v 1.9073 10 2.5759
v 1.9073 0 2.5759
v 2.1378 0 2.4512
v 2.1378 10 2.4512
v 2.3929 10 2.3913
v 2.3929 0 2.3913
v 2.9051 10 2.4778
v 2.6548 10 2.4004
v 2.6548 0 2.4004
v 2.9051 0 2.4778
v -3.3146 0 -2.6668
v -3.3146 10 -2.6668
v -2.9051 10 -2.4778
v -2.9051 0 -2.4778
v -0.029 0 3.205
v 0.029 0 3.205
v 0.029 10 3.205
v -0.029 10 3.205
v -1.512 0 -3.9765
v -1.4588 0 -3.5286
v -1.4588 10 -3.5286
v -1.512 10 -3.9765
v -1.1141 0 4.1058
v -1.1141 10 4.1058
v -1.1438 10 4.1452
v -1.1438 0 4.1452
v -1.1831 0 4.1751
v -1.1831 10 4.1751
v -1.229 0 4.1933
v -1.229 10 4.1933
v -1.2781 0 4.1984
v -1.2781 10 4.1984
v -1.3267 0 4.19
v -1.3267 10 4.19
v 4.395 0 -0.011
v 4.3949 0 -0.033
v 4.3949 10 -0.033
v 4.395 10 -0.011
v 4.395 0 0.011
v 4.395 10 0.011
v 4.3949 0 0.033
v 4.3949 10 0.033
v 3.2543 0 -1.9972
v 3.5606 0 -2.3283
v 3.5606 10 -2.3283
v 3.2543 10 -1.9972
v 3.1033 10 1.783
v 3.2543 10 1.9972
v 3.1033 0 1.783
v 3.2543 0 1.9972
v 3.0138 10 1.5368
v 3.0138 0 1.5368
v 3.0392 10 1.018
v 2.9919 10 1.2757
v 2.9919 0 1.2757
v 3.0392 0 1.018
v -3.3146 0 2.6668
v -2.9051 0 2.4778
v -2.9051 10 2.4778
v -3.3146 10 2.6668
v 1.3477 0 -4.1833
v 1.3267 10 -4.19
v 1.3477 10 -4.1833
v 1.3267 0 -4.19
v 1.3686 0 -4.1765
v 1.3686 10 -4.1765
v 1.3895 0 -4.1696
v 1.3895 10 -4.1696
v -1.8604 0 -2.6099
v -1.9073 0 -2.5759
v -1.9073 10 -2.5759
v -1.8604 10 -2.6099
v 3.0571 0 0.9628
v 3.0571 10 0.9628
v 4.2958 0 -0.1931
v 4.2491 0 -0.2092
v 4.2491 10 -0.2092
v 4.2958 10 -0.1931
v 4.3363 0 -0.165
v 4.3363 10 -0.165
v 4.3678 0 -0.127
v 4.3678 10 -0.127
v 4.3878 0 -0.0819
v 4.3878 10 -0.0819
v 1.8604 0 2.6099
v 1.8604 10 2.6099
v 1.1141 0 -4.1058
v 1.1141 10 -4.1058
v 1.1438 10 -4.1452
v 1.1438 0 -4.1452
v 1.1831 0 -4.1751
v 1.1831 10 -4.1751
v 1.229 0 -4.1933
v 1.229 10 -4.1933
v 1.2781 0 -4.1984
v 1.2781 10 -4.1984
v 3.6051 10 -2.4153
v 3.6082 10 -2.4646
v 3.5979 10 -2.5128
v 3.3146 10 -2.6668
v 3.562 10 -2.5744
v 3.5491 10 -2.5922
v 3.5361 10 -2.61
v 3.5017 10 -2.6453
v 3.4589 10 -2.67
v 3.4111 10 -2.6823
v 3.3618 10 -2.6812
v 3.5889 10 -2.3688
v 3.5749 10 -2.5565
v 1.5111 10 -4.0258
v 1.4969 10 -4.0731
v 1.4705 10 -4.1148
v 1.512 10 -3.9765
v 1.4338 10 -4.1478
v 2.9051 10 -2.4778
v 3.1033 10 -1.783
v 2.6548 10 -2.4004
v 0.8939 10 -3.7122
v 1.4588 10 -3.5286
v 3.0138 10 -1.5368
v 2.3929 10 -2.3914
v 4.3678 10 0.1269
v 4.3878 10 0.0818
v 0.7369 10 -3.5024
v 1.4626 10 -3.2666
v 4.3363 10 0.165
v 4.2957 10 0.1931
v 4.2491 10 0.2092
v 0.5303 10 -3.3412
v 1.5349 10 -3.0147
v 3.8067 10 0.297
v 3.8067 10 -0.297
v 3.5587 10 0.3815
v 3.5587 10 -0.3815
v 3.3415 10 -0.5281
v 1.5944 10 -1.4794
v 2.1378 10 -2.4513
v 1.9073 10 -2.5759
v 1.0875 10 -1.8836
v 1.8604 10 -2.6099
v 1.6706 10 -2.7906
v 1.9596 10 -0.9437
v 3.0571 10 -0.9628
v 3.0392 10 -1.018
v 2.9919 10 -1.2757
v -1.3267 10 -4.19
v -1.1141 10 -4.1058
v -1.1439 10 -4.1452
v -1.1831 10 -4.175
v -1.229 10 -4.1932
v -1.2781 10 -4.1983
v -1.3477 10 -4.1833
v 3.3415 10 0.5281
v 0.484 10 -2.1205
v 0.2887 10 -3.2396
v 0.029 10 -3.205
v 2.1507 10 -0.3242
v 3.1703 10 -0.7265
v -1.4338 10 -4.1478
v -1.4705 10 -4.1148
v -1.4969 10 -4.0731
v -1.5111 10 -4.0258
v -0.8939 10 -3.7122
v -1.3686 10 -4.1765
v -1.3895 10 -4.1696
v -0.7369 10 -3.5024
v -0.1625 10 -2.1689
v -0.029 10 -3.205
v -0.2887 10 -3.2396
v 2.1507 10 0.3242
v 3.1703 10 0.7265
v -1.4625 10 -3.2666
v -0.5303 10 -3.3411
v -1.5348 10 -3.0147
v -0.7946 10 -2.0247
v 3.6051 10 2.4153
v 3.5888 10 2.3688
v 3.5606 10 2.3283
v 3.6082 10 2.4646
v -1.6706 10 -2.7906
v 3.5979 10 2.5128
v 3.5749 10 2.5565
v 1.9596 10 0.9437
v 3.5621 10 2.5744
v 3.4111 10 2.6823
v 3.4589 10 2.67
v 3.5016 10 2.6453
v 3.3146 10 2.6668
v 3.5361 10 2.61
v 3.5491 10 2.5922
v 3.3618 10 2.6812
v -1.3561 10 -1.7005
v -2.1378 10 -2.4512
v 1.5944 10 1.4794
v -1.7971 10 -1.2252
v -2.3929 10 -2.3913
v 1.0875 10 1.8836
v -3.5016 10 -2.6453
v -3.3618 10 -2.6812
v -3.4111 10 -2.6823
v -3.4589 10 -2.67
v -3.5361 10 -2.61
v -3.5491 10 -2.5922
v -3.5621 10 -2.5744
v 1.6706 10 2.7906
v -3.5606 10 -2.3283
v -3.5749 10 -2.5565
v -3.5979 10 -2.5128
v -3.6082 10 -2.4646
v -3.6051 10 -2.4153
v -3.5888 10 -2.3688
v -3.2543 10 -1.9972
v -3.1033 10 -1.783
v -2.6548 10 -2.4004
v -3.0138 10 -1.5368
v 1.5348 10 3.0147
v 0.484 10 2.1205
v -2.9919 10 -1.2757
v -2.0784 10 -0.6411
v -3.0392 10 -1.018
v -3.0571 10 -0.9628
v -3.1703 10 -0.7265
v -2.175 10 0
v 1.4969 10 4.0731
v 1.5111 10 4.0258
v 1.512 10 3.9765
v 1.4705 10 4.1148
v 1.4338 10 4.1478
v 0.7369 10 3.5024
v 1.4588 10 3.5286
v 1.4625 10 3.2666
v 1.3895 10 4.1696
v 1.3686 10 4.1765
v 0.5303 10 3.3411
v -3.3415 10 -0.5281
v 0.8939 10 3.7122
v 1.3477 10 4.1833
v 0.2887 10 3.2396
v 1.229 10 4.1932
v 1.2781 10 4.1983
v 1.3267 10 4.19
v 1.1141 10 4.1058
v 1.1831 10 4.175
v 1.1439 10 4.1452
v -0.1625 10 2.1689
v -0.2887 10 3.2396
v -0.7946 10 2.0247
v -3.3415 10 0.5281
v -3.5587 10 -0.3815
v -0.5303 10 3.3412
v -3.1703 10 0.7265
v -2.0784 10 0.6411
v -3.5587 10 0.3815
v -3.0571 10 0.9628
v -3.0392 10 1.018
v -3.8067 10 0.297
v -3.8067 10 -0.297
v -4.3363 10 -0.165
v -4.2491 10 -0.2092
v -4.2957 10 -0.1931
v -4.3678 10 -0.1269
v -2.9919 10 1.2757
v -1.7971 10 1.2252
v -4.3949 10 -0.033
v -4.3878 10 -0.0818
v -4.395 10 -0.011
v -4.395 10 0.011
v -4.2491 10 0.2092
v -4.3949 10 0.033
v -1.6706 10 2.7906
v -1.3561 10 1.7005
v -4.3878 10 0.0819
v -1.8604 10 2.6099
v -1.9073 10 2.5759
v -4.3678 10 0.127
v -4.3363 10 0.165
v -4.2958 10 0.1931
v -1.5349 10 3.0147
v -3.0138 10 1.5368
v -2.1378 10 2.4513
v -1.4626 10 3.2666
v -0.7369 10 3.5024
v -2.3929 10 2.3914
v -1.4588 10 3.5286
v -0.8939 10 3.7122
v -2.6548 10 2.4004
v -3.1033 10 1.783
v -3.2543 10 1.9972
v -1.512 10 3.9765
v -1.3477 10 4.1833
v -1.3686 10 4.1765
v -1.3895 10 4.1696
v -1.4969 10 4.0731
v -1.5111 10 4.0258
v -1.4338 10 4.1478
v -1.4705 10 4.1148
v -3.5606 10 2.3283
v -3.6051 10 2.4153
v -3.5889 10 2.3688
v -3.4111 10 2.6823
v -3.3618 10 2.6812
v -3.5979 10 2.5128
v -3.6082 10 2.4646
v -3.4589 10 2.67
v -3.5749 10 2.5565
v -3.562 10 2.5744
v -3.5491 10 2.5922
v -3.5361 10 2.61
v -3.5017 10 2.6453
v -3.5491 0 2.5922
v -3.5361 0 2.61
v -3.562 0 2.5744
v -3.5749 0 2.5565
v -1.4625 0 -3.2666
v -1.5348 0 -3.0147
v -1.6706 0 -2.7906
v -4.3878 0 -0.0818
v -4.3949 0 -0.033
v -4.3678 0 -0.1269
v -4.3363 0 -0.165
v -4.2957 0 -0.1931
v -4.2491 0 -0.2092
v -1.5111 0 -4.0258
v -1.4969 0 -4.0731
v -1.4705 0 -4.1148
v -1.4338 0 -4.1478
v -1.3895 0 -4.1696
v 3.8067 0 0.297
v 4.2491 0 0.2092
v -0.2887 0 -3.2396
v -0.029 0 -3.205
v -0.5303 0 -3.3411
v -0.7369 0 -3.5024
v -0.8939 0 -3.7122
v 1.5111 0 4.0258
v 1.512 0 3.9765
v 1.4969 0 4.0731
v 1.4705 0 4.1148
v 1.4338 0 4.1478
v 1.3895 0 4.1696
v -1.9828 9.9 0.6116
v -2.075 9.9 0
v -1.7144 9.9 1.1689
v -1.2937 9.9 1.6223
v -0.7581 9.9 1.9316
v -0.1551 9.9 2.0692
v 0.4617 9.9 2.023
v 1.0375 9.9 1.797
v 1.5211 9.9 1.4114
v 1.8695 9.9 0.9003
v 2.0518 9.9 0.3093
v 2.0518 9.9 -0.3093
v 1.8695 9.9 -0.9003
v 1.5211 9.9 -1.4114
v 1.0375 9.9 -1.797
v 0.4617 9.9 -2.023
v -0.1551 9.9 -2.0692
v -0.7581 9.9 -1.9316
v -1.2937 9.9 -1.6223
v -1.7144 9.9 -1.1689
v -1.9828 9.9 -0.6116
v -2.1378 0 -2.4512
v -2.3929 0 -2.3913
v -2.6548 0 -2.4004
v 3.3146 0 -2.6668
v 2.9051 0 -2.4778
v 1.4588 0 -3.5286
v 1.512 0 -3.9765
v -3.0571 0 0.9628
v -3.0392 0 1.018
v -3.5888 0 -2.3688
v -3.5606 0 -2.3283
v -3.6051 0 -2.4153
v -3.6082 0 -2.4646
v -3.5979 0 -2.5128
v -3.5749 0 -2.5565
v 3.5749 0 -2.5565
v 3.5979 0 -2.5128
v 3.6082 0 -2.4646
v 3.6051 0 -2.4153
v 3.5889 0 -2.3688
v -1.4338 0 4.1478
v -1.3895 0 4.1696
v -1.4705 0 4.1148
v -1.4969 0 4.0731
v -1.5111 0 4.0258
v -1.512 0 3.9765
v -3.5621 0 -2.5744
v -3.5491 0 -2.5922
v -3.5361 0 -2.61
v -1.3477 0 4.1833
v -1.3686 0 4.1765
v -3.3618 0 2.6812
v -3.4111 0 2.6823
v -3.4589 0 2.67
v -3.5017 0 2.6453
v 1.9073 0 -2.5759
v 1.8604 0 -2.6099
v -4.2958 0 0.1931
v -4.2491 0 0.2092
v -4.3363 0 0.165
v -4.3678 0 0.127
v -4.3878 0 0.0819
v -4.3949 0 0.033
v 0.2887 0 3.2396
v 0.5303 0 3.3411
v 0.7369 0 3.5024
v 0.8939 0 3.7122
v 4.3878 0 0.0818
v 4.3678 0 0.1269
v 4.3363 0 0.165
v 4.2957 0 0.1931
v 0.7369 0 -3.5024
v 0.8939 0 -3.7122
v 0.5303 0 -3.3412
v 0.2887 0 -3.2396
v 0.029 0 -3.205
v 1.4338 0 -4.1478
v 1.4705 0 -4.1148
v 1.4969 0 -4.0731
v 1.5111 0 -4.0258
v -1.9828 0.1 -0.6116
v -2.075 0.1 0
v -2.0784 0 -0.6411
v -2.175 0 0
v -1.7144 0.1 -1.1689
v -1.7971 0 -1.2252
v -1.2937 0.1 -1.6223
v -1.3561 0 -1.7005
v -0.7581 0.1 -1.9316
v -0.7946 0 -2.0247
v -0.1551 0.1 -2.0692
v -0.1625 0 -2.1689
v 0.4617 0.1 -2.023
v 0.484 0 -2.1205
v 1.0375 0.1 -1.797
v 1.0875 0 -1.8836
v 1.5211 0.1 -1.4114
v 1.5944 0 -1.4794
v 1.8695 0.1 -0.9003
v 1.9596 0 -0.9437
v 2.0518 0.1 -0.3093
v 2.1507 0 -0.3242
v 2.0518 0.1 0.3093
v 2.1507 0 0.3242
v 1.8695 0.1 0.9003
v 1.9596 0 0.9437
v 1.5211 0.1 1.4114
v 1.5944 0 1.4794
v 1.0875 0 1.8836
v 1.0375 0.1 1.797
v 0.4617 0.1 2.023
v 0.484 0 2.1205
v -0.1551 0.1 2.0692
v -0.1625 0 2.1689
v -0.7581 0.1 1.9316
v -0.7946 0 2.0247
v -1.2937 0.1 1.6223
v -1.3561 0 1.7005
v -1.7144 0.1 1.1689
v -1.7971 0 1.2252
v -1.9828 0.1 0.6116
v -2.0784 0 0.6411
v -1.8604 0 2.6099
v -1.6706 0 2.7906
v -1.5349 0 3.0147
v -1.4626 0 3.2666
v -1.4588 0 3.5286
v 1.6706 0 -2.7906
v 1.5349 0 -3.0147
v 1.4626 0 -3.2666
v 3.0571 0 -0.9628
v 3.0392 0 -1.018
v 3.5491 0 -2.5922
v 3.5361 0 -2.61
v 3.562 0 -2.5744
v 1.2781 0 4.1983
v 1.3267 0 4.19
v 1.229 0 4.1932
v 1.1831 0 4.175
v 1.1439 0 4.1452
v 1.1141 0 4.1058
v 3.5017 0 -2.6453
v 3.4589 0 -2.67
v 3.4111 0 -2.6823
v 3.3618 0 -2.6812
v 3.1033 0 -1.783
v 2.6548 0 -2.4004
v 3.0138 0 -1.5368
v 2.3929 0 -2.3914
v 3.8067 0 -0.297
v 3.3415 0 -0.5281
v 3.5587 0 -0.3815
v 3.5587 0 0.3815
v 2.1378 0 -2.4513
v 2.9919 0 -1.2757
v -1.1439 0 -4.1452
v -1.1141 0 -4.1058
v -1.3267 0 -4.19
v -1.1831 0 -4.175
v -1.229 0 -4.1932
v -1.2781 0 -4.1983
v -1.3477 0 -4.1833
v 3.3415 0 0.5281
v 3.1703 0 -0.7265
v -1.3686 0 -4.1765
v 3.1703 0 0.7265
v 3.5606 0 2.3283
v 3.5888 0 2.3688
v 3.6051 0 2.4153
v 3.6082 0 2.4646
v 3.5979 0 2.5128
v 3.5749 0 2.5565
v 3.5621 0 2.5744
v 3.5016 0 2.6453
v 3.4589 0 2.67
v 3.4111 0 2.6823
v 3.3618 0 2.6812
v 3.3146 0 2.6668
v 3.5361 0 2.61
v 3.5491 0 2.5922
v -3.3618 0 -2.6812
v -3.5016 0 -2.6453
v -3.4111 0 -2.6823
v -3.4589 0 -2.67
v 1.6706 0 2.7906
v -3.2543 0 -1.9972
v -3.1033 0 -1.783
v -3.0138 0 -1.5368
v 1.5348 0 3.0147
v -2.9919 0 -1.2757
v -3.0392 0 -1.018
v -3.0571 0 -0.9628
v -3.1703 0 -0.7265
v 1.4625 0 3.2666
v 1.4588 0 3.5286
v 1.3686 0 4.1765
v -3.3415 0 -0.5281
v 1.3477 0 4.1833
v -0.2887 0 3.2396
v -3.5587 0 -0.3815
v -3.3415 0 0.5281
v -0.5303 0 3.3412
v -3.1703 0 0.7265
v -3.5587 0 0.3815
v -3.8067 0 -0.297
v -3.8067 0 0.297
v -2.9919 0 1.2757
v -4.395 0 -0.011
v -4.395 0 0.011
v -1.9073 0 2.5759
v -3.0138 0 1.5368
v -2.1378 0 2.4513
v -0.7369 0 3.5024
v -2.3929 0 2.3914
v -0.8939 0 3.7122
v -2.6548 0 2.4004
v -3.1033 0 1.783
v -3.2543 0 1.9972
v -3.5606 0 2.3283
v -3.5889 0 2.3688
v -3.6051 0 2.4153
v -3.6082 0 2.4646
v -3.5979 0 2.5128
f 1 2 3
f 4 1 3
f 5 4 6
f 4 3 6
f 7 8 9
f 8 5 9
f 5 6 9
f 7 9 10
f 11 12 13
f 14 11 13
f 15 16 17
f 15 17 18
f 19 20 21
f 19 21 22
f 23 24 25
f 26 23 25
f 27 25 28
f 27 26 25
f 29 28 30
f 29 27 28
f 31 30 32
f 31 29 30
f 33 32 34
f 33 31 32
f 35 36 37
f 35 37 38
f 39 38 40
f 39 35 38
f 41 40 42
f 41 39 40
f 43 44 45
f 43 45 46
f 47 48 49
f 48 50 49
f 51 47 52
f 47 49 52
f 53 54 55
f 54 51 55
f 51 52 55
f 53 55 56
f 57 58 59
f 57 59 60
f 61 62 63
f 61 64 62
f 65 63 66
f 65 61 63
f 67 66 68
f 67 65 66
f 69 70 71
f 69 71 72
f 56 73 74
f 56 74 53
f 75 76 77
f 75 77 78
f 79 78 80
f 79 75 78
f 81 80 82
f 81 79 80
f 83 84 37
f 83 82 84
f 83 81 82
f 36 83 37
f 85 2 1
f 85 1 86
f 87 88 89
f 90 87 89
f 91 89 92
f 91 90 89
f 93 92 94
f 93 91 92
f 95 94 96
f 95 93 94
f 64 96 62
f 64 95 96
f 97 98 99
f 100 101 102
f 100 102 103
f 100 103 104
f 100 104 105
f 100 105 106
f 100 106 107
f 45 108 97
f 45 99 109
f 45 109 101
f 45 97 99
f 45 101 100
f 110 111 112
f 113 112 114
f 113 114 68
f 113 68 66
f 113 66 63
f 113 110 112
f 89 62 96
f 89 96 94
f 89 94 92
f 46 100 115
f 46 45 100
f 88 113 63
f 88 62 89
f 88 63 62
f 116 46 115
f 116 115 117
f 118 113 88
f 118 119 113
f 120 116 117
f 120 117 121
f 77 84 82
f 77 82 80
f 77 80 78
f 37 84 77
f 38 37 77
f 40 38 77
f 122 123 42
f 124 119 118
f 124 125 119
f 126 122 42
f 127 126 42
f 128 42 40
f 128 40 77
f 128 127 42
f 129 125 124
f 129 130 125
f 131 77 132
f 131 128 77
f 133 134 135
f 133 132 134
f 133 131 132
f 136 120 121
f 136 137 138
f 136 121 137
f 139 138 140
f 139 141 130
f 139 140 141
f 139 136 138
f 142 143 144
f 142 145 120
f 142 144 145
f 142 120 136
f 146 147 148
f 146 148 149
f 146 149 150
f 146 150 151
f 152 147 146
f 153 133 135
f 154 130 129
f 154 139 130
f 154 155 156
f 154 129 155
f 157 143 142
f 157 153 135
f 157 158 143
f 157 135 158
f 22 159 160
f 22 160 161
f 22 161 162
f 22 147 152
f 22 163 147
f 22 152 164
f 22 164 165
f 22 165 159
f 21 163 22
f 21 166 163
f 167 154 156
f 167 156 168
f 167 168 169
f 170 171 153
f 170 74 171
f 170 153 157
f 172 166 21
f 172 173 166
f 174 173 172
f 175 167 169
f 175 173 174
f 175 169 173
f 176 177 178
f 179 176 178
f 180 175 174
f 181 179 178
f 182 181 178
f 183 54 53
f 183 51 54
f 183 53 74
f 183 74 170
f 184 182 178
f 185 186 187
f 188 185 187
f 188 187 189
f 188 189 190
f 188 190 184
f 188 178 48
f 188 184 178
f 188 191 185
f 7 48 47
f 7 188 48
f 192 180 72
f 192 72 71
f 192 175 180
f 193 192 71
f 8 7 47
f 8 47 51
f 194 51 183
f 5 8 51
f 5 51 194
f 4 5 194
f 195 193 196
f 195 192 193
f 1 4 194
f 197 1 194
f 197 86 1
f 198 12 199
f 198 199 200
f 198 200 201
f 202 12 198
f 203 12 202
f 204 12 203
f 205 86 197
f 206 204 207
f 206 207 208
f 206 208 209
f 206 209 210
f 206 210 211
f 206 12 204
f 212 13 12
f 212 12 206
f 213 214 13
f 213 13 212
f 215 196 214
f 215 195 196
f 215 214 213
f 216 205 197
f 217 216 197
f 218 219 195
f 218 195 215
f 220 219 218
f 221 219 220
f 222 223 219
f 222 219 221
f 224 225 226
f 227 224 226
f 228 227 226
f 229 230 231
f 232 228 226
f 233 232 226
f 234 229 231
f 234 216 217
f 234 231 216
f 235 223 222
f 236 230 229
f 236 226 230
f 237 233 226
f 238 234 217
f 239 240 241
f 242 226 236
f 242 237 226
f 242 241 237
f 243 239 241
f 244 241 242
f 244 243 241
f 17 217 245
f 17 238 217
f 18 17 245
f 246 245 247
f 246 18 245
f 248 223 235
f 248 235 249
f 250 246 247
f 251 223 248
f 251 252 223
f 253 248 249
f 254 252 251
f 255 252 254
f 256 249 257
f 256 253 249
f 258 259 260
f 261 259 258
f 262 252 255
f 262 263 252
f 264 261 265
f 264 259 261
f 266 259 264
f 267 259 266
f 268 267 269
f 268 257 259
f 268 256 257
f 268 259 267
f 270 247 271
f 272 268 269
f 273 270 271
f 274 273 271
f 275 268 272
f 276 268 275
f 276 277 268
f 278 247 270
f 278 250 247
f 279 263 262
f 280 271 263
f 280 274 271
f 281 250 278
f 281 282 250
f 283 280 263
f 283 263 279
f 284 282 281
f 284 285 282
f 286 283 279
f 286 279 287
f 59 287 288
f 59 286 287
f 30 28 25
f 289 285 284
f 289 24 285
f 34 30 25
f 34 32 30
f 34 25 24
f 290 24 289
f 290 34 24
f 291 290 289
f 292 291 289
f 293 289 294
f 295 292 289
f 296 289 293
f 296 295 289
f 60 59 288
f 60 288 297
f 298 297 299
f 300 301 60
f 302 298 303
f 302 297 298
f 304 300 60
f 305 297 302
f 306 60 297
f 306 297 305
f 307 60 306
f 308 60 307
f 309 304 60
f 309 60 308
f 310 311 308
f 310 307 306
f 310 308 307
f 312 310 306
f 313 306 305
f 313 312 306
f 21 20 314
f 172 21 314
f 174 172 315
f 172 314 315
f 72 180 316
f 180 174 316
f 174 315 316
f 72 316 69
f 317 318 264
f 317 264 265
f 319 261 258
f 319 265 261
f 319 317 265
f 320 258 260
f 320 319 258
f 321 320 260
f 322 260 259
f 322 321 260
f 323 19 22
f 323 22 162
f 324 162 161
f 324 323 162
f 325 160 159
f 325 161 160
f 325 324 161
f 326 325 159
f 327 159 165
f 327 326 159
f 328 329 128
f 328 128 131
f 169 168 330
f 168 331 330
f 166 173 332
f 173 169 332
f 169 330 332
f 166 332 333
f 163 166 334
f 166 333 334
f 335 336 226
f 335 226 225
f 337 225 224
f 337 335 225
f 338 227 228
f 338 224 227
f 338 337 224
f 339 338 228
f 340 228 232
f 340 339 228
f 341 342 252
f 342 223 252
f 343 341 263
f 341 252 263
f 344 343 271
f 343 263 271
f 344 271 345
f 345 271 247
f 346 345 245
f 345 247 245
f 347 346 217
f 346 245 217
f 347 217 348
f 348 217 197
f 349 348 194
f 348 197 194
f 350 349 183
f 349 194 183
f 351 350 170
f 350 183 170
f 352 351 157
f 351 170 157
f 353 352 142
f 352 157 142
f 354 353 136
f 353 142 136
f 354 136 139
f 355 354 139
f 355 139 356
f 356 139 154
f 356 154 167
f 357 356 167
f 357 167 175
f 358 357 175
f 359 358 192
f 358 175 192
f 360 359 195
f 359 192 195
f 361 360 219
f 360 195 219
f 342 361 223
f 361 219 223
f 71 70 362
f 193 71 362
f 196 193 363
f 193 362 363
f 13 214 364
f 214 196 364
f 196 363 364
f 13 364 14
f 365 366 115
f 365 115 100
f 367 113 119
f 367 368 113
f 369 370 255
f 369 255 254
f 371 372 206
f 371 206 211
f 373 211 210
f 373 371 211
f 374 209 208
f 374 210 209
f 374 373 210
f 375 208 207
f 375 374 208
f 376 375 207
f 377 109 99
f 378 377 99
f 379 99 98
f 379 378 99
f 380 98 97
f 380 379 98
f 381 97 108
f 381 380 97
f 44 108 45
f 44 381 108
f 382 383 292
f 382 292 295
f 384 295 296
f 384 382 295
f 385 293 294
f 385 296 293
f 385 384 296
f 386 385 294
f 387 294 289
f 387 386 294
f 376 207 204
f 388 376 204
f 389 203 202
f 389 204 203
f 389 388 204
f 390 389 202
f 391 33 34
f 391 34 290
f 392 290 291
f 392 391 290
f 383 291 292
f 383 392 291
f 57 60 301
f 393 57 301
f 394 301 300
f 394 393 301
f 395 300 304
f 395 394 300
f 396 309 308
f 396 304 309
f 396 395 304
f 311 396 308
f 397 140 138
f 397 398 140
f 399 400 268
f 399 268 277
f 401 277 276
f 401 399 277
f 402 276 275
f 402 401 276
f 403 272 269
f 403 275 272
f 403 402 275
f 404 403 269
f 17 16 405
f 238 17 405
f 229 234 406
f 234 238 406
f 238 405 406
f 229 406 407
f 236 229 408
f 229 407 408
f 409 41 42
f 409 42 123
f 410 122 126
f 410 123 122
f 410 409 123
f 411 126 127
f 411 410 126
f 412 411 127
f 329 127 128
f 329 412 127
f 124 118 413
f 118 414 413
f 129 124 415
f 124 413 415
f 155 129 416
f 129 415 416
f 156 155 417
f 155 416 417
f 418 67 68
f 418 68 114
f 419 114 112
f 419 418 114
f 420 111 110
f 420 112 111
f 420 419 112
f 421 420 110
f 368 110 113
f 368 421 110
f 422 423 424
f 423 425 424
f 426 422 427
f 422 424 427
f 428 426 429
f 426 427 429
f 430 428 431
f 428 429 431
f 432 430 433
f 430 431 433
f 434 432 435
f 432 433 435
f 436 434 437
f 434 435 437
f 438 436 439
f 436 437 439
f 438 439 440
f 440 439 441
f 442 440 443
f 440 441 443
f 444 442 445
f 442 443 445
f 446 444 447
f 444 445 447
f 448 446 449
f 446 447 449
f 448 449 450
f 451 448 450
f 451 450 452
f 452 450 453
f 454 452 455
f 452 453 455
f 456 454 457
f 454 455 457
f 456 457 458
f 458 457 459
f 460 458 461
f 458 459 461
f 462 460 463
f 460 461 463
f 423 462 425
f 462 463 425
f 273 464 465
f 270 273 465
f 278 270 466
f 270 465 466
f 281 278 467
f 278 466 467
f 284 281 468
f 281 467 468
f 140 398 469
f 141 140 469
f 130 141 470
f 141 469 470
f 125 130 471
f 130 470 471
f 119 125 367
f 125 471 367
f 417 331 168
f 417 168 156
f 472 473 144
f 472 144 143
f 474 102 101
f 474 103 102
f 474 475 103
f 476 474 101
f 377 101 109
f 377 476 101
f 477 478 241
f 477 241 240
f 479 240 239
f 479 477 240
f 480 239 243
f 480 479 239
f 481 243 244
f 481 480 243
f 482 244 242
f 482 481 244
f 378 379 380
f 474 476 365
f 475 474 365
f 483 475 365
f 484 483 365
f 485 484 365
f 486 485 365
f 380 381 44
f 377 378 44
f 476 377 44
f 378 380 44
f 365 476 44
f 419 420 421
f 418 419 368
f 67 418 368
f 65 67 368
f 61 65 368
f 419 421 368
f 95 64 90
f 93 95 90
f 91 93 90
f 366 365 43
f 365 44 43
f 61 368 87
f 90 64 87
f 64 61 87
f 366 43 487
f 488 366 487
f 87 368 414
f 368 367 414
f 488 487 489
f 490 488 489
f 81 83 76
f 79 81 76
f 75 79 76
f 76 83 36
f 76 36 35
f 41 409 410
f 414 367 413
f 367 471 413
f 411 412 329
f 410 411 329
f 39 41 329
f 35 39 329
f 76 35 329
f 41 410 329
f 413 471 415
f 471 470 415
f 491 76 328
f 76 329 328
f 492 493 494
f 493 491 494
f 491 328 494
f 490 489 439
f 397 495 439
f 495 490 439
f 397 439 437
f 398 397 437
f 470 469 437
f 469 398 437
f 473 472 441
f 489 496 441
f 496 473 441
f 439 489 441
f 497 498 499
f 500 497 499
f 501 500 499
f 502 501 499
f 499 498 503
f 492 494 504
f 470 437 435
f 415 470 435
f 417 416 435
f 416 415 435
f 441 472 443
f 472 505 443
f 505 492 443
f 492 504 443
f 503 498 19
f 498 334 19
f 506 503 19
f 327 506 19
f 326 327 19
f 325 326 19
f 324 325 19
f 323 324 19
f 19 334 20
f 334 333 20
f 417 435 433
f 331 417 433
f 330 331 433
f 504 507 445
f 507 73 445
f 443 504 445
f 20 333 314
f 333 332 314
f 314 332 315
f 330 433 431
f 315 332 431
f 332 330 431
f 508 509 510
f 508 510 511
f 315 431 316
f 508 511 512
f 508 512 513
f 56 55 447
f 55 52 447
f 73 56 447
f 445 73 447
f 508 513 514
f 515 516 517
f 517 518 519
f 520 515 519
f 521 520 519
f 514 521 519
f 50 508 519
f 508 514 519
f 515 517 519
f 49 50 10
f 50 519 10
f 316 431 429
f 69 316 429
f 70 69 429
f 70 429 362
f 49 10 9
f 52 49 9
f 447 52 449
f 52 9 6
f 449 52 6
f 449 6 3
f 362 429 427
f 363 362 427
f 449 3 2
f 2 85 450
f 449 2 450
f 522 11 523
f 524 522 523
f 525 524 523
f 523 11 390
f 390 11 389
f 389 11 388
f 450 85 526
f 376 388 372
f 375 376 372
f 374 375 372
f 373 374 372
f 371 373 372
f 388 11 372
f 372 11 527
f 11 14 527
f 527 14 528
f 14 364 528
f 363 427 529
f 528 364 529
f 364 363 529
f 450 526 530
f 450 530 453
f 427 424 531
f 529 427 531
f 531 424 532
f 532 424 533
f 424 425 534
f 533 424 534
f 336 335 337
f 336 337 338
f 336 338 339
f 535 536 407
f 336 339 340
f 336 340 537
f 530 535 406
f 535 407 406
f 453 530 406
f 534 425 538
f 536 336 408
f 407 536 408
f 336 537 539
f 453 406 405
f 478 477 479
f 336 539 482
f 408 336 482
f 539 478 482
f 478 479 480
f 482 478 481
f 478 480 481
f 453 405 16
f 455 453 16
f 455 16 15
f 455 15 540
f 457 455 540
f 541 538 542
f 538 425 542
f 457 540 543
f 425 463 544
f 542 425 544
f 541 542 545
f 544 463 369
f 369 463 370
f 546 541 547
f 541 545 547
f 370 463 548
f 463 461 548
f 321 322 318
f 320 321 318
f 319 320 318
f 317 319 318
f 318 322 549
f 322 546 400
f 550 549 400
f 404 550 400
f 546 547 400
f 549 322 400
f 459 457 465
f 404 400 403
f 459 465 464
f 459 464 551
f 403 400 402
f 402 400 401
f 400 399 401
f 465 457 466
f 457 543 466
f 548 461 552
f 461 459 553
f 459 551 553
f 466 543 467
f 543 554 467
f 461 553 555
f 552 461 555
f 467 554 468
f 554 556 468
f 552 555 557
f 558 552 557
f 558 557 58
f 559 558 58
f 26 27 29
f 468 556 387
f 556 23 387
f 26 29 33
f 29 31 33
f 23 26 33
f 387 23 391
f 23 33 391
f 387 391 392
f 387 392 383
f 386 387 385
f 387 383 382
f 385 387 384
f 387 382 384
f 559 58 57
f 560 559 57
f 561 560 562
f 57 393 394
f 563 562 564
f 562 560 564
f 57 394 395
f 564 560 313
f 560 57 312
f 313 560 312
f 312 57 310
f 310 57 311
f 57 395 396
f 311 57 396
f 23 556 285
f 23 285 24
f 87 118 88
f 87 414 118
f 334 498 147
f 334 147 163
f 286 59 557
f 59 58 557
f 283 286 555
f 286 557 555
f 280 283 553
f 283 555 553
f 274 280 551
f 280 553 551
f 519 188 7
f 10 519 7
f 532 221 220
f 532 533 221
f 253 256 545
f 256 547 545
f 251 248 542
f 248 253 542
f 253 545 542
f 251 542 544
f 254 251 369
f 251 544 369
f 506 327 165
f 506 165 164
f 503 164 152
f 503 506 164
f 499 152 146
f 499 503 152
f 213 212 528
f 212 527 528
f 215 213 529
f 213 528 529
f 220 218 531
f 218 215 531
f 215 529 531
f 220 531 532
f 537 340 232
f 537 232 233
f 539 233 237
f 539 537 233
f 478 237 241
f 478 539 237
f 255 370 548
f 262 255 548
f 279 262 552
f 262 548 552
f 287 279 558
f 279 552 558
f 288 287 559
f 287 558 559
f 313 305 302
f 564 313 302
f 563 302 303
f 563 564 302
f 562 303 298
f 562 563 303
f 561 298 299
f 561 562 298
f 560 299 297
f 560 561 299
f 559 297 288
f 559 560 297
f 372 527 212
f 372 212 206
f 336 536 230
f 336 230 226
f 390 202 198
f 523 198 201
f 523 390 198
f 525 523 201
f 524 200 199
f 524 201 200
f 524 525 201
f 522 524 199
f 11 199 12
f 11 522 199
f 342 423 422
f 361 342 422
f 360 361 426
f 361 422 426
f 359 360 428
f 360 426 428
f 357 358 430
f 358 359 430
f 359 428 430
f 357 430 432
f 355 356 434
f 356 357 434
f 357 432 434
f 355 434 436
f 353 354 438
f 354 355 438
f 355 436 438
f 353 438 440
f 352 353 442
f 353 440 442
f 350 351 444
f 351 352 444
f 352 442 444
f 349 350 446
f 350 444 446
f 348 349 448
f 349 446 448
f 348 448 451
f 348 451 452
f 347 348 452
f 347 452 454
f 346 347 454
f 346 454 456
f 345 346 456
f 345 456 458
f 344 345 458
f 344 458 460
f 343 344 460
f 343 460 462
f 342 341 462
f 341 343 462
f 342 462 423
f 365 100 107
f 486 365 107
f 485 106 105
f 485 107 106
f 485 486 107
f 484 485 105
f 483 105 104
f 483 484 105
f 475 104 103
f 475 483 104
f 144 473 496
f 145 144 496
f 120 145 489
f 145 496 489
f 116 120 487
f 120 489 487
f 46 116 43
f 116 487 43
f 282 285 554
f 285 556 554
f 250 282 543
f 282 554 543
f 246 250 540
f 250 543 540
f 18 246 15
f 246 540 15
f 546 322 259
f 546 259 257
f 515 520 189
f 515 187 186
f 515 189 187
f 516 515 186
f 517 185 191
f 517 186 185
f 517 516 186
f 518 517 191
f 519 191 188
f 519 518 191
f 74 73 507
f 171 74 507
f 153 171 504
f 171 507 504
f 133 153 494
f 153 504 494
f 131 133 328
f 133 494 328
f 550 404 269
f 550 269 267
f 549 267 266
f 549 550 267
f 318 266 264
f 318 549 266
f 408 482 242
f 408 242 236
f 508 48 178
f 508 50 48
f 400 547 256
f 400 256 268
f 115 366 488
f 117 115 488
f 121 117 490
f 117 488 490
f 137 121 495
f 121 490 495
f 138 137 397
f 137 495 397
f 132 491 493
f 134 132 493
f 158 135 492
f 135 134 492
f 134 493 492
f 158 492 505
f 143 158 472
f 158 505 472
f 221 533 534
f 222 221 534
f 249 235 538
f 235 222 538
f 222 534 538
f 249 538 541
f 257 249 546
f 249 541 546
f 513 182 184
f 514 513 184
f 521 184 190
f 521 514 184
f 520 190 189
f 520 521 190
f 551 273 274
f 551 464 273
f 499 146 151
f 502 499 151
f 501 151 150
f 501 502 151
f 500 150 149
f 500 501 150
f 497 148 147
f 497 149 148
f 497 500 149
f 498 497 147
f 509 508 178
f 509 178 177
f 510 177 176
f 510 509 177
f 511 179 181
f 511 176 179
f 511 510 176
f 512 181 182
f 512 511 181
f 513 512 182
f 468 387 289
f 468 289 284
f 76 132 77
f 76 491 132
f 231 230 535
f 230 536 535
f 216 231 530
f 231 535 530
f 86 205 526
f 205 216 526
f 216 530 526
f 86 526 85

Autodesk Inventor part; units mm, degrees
ref_plane "YZ Plane" through (0, 0, 0) normal (1, 0, 0) x (0, 1, 0)
ref_plane "XZ Plane" through (0, 0, 0) normal (0, 1, 0) x (-1, 0, 0)
ref_plane "XY Plane" through (0, 0, 0) normal (0, 0, 1) x (1, 0, 0)
sketch "Sketch3" plane through (0, 0, 0) normal (0, 1, 0) x (-1, 0, 0)
  line L0 (0.8939, 3.7122) -> (1.1141, 4.1058)
  arc A0 (1.3267, 4.19) -> (1.1141, 4.1058) centre (1.272, 4.0174) ccw
  arc A1 (1.3895, 4.1696) -> (1.3267, 4.19) centre (0, 0) ccw
  arc A2 (1.512, 3.9765) -> (1.3895, 4.1696) centre (1.3323, 3.9979) ccw
  line L1 (1.512, 3.9765) -> (1.4588, 3.5286)
  arc A3 (1.4588, 3.5286) -> (1.8604, 2.6099) centre (2.4429, 3.4117) ccw
  line L2 (1.8604, 2.6099) -> (1.9073, 2.5759)
  arc A4 (1.9073, 2.5759) -> (2.9051, 2.4778) centre (2.4898, 3.3776) ccw
  line L3 (2.9051, 2.4778) -> (3.3146, 2.6668)
  arc A5 (3.5361, 2.61) -> (3.3146, 2.6668) centre (3.3905, 2.5025) ccw
  arc A6 (3.5749, 2.5565) -> (3.5361, 2.61) centre (0, 0) ccw
  arc A7 (3.5606, 2.3283) -> (3.5749, 2.5565) centre (3.4277, 2.4512) ccw
  line L4 (3.5606, 2.3283) -> (3.2543, 1.9972)
  arc A8 (3.2543, 1.9972) -> (3.0392, 1.018) centre (3.9817, 1.3242) ccw
  line L5 (3.0392, 1.018) -> (3.0571, 0.9628)
  arc A9 (3.0571, 0.9628) -> (3.8067, 0.297) centre (3.9996, 1.2691) ccw
  line L6 (3.8067, 0.297) -> (4.2491, 0.2092)
  arc A10 (4.3949, 0.033) -> (4.2491, 0.2092) centre (4.2139, 0.0317) ccw
  arc A11 (4.3949, -0.033) -> (4.3949, 0.033) centre (0, 0) ccw
  arc A12 (4.2491, -0.2092) -> (4.3949, -0.033) centre (4.2139, -0.0317) ccw
  line L7 (4.2491, -0.2092) -> (3.8067, -0.297)
  arc A13 (3.8067, -0.297) -> (3.0571, -0.9628) centre (3.9996, -1.2691) ccw
  line L8 (3.0571, -0.9628) -> (3.0392, -1.018)
  arc A14 (3.0392, -1.018) -> (3.2543, -1.9972) centre (3.9817, -1.3242) ccw
  line L9 (3.2543, -1.9972) -> (3.5606, -2.3283)
  arc A15 (3.5749, -2.5565) -> (3.5606, -2.3283) centre (3.4277, -2.4512) ccw
  arc A16 (3.5361, -2.61) -> (3.5749, -2.5565) centre (0, 0) ccw
  arc A17 (3.3146, -2.6668) -> (3.5361, -2.61) centre (3.3905, -2.5025) ccw
  line L10 (3.3146, -2.6668) -> (2.9051, -2.4778)
  arc A18 (2.9051, -2.4778) -> (1.9073, -2.5759) centre (2.4898, -3.3776) ccw
  line L11 (1.9073, -2.5759) -> (1.8604, -2.6099)
  arc A19 (1.8604, -2.6099) -> (1.4588, -3.5286) centre (2.4429, -3.4117) ccw
  line L12 (1.4588, -3.5286) -> (1.512, -3.9765)
  arc A20 (1.3895, -4.1696) -> (1.512, -3.9765) centre (1.3323, -3.9979) ccw
  arc A21 (1.3267, -4.19) -> (1.3895, -4.1696) centre (0, 0) ccw
  arc A22 (1.1141, -4.1058) -> (1.3267, -4.19) centre (1.272, -4.0174) ccw
  line L13 (1.1141, -4.1058) -> (0.8939, -3.7122)
  arc A23 (0.8939, -3.7122) -> (0.029, -3.205) centre (0.029, -4.196) ccw
  line L14 (0.029, -3.205) -> (-0.029, -3.205)
  arc A24 (-0.029, -3.205) -> (-0.8939, -3.7122) centre (-0.029, -4.196) ccw
  line L15 (-0.8939, -3.7122) -> (-1.1141, -4.1058)
  arc A25 (-1.3267, -4.19) -> (-1.1141, -4.1058) centre (-1.272, -4.0174) ccw
  arc A26 (-1.3895, -4.1696) -> (-1.3267, -4.19) centre (0, 0) ccw
  arc A27 (-1.512, -3.9765) -> (-1.3895, -4.1696) centre (-1.3323, -3.9979) ccw
  line L16 (-1.512, -3.9765) -> (-1.4588, -3.5286)
  arc A28 (-1.4588, -3.5286) -> (-1.8604, -2.6099) centre (-2.4429, -3.4117) ccw
  line L17 (-1.8604, -2.6099) -> (-1.9073, -2.5759)
  arc A29 (-1.9073, -2.5759) -> (-2.9051, -2.4778) centre (-2.4898, -3.3776) ccw
  line L18 (-2.9051, -2.4778) -> (-3.3146, -2.6668)
  arc A30 (-3.5361, -2.61) -> (-3.3146, -2.6668) centre (-3.3905, -2.5025) ccw
  arc A31 (-3.5749, -2.5565) -> (-3.5361, -2.61) centre (0, 0) ccw
  arc A32 (-3.5606, -2.3283) -> (-3.5749, -2.5565) centre (-3.4277, -2.4512) ccw
  line L19 (-3.5606, -2.3283) -> (-3.2543, -1.9972)
  arc A33 (-3.2543, -1.9972) -> (-3.0392, -1.018) centre (-3.9817, -1.3242) ccw
  line L20 (-3.0392, -1.018) -> (-3.0571, -0.9628)
  arc A34 (-3.0571, -0.9628) -> (-3.8067, -0.297) centre (-3.9996, -1.2691) ccw
  line L21 (-3.8067, -0.297) -> (-4.2491, -0.2092)
  arc A35 (-4.3949, -0.033) -> (-4.2491, -0.2092) centre (-4.2139, -0.0317) ccw
  arc A36 (-4.3949, 0.033) -> (-4.3949, -0.033) centre (0, 0) ccw
  arc A37 (-4.2491, 0.2092) -> (-4.3949, 0.033) centre (-4.2139, 0.0317) ccw
  line L22 (-4.2491, 0.2092) -> (-3.8067, 0.297)
  arc A38 (-3.8067, 0.297) -> (-3.0571, 0.9628) centre (-3.9996, 1.2691) ccw
  line L23 (-3.0571, 0.9628) -> (-3.0392, 1.018)
  arc A39 (-3.0392, 1.018) -> (-3.2543, 1.9972) centre (-3.9817, 1.3242) ccw
  line L24 (-3.2543, 1.9972) -> (-3.5606, 2.3283)
  arc A40 (-3.5749, 2.5565) -> (-3.5606, 2.3283) centre (-3.4277, 2.4512) ccw
  arc A41 (-3.5361, 2.61) -> (-3.5749, 2.5565) centre (0, 0) ccw
  arc A42 (-3.3146, 2.6668) -> (-3.5361, 2.61) centre (-3.3905, 2.5025) ccw
  line L25 (-3.3146, 2.6668) -> (-2.9051, 2.4778)
  arc A43 (-2.9051, 2.4778) -> (-1.9073, 2.5759) centre (-2.4898, 3.3776) ccw
  line L26 (-1.9073, 2.5759) -> (-1.8604, 2.6099)
  arc A44 (-1.8604, 2.6099) -> (-1.4588, 3.5286) centre (-2.4429, 3.4117) ccw
  line L27 (-1.4588, 3.5286) -> (-1.512, 3.9765)
  arc A45 (-1.3895, 4.1696) -> (-1.512, 3.9765) centre (-1.3323, 3.9979) ccw
  arc A46 (-1.3267, 4.19) -> (-1.3895, 4.1696) centre (0, 0) ccw
  arc A47 (-1.1141, 4.1058) -> (-1.3267, 4.19) centre (-1.272, 4.0174) ccw
  line L28 (-1.1141, 4.1058) -> (-0.8939, 3.7122)
  arc A48 (-0.8939, 3.7122) -> (-0.029, 3.205) centre (-0.029, 4.196) ccw
  line L29 (-0.029, 3.205) -> (0.029, 3.205)
  arc A49 (0.029, 3.205) -> (0.8939, 3.7122) centre (0.029, 4.196) ccw
  arc A50 (-0.029, -3.405) -> (-0.7193, -3.8098) centre (-0.029, -4.196) ccw
  line L30 (-0.029, -3.405) -> (0.029, -3.405)
  arc A51 (0.7193, -3.8098) -> (0.029, -3.405) centre (0.029, -4.196) ccw
  line L31 (0.7193, -3.8098) -> (0.9395, -4.2034)
  arc A52 (0.9395, -4.2034) -> (1.387, -4.3807) centre (1.272, -4.0174) ccw
  arc A53 (1.387, -4.3807) -> (1.4527, -4.3593) centre (0, 0) ccw
  arc A54 (1.4527, -4.3593) -> (1.7106, -3.9529) centre (1.3323, -3.9979) ccw
  line L32 (1.7106, -3.9529) -> (1.6574, -3.505)
  arc A55 (1.9779, -2.7717) -> (1.6574, -3.505) centre (2.4429, -3.4117) ccw
  line L33 (1.9779, -2.7717) -> (2.0249, -2.7377)
  arc A56 (2.8213, -2.6594) -> (2.0249, -2.7377) centre (2.4898, -3.3776) ccw
  line L34 (2.8213, -2.6594) -> (3.2308, -2.8484)
  arc A57 (3.2308, -2.8484) -> (3.697, -2.7287) centre (3.3905, -2.5025) ccw
  arc A58 (3.697, -2.7287) -> (3.7376, -2.6729) centre (0, 0) ccw
  arc A59 (3.7376, -2.6729) -> (3.7074, -2.1925) centre (3.4277, -2.4512) ccw
  line L35 (3.7074, -2.1925) -> (3.4011, -1.8614)
  arc A60 (3.2294, -1.0798) -> (3.4011, -1.8614) centre (3.9817, -1.3242) ccw
  line L36 (3.2294, -1.0798) -> (3.2473, -1.0246)
  arc A61 (3.8456, -0.4932) -> (3.2473, -1.0246) centre (3.9996, -1.2691) ccw
  line L37 (3.8456, -0.4932) -> (4.288, -0.4054)
  arc A62 (4.288, -0.4054) -> (4.5949, -0.0345) centre (4.2139, -0.0317) ccw
  arc A63 (4.5949, -0.0345) -> (4.5949, 0.0345) centre (0, 0) ccw
  arc A64 (4.5949, 0.0345) -> (4.288, 0.4054) centre (4.2139, 0.0317) ccw
  line L38 (4.288, 0.4054) -> (3.8456, 0.4932)
  arc A65 (3.2473, 1.0246) -> (3.8456, 0.4932) centre (3.9996, 1.2691) ccw
  line L39 (3.2473, 1.0246) -> (3.2294, 1.0798)
  arc A66 (3.4011, 1.8614) -> (3.2294, 1.0798) centre (3.9817, 1.3242) ccw
  line L40 (3.4011, 1.8614) -> (3.7074, 2.1925)
  arc A67 (3.7074, 2.1925) -> (3.7376, 2.6729) centre (3.4277, 2.4512) ccw
  arc A68 (3.7376, 2.6729) -> (3.697, 2.7287) centre (0, 0) ccw
  arc A69 (3.697, 2.7287) -> (3.2308, 2.8484) centre (3.3905, 2.5025) ccw
  line L41 (3.2308, 2.8484) -> (2.8213, 2.6594)
  arc A70 (2.0249, 2.7377) -> (2.8213, 2.6594) centre (2.4898, 3.3776) ccw
  line L42 (2.0249, 2.7377) -> (1.9779, 2.7717)
  arc A71 (1.6574, 3.505) -> (1.9779, 2.7717) centre (2.4429, 3.4117) ccw
  line L43 (1.6574, 3.505) -> (1.7106, 3.9529)
  arc A72 (1.7106, 3.9529) -> (1.4527, 4.3593) centre (1.3323, 3.9979) ccw
  arc A73 (1.4527, 4.3593) -> (1.387, 4.3807) centre (0, 0) ccw
  arc A74 (1.387, 4.3807) -> (0.9395, 4.2034) centre (1.272, 4.0174) ccw
  line L44 (0.9395, 4.2034) -> (0.7193, 3.8098)
  arc A75 (0.029, 3.405) -> (0.7193, 3.8098) centre (0.029, 4.196) ccw
  line L45 (0.029, 3.405) -> (-0.029, 3.405)
  arc A76 (-0.7193, 3.8098) -> (-0.029, 3.405) centre (-0.029, 4.196) ccw
  line L46 (-0.7193, 3.8098) -> (-0.9395, 4.2034)
  arc A77 (-0.9395, 4.2034) -> (-1.387, 4.3807) centre (-1.272, 4.0174) ccw
  arc A78 (-1.387, 4.3807) -> (-1.4527, 4.3593) centre (0, 0) ccw
  arc A79 (-1.4527, 4.3593) -> (-1.7106, 3.9529) centre (-1.3323, 3.9979) ccw
  line L47 (-1.7106, 3.9529) -> (-1.6574, 3.505)
  arc A80 (-1.9779, 2.7717) -> (-1.6574, 3.505) centre (-2.4429, 3.4117) ccw
  line L48 (-1.9779, 2.7717) -> (-2.0249, 2.7377)
  arc A81 (-2.8213, 2.6594) -> (-2.0249, 2.7377) centre (-2.4898, 3.3776) ccw
  line L49 (-2.8213, 2.6594) -> (-3.2308, 2.8484)
  arc A82 (-3.2308, 2.8484) -> (-3.697, 2.7287) centre (-3.3905, 2.5025) ccw
  arc A83 (-3.697, 2.7287) -> (-3.7376, 2.6729) centre (0, 0) ccw
  arc A84 (-3.7376, 2.6729) -> (-3.7074, 2.1925) centre (-3.4277, 2.4512) ccw
  line L50 (-3.7074, 2.1925) -> (-3.4011, 1.8614)
  arc A85 (-3.2294, 1.0798) -> (-3.4011, 1.8614) centre (-3.9817, 1.3242) ccw
  line L51 (-3.2294, 1.0798) -> (-3.2473, 1.0246)
  arc A86 (-3.8456, 0.4932) -> (-3.2473, 1.0246) centre (-3.9996, 1.2691) ccw
  line L52 (-3.8456, 0.4932) -> (-4.288, 0.4054)
  arc A87 (-4.288, 0.4054) -> (-4.5949, 0.0345) centre (-4.2139, 0.0317) ccw
  arc A88 (-4.5949, 0.0345) -> (-4.5949, -0.0345) centre (0, 0) ccw
  arc A89 (-4.5949, -0.0345) -> (-4.288, -0.4054) centre (-4.2139, -0.0317) ccw
  line L53 (-4.288, -0.4054) -> (-3.8456, -0.4932)
  arc A90 (-3.2473, -1.0246) -> (-3.8456, -0.4932) centre (-3.9996, -1.2691) ccw
  line L54 (-3.2473, -1.0246) -> (-3.2294, -1.0798)
  arc A91 (-3.4011, -1.8614) -> (-3.2294, -1.0798) centre (-3.9817, -1.3242) ccw
  line L55 (-3.4011, -1.8614) -> (-3.7074, -2.1925)
  arc A92 (-2.0249, -2.7377) -> (-2.8213, -2.6594) centre (-2.4898, -3.3776) ccw
  line L56 (-2.0249, -2.7377) -> (-1.9779, -2.7717)
  arc A93 (-1.6574, -3.505) -> (-1.9779, -2.7717) centre (-2.4429, -3.4117) ccw
  line L57 (-1.6574, -3.505) -> (-1.7106, -3.9529)
  arc A94 (-1.7106, -3.9529) -> (-1.4527, -4.3593) centre (-1.3323, -3.9979) ccw
  arc A95 (-1.4527, -4.3593) -> (-1.387, -4.3807) centre (0, 0) ccw
  arc A96 (-1.387, -4.3807) -> (-0.9395, -4.2034) centre (-1.272, -4.0174) ccw
  line L58 (-0.9395, -4.2034) -> (-0.7193, -3.8098)
  circle A97 centre (0, 0) radius 2.075
  arc A98 (-0.029, -3.455) -> (-0.6757, -3.8342) centre (-0.029, -4.196) ccw
  line L59 (-0.029, -3.455) -> (0.029, -3.455)
  arc A99 (0.6757, -3.8342) -> (0.029, -3.455) centre (0.029, -4.196) ccw
  line L60 (0.6757, -3.8342) -> (0.8959, -4.2279)
  arc A100 (0.8959, -4.2279) -> (1.4021, -4.4283) centre (1.272, -4.0174) ccw
  arc A101 (1.4021, -4.4283) -> (1.4685, -4.4067) centre (0, 0) ccw
  arc A102 (1.4685, -4.4067) -> (1.7603, -3.947) centre (1.3323, -3.9979) ccw
  line L61 (1.7603, -3.947) -> (1.7071, -3.4991)
  arc A103 (2.0073, -2.8122) -> (1.7071, -3.4991) centre (2.4429, -3.4117) ccw
  line L62 (2.0073, -2.8122) -> (2.0543, -2.7781)
  arc A104 (2.8003, -2.7048) -> (2.0543, -2.7781) centre (2.4898, -3.3776) ccw
  line L63 (2.8003, -2.7048) -> (3.2099, -2.8938)
  arc A105 (3.2099, -2.8938) -> (3.7373, -2.7584) centre (3.3905, -2.5025) ccw
  arc A106 (3.7373, -2.7584) -> (3.7783, -2.7019) centre (0, 0) ccw
  arc A107 (3.7783, -2.7019) -> (3.7441, -2.1585) centre (3.4277, -2.4512) ccw
  line L64 (3.7441, -2.1585) -> (3.4378, -1.8274)
  arc A108 (3.2769, -1.0952) -> (3.4378, -1.8274) centre (3.9817, -1.3242) ccw
  line L65 (3.2769, -1.0952) -> (3.2949, -1.0401)
  arc A109 (3.8554, -0.5422) -> (3.2949, -1.0401) centre (3.9996, -1.2691) ccw
  line L66 (3.8554, -0.5422) -> (4.2978, -0.4544)
  arc A110 (4.2978, -0.4544) -> (4.6449, -0.0349) centre (4.2139, -0.0317) ccw
  arc A111 (4.6449, -0.0349) -> (4.6449, 0.0349) centre (0, 0) ccw
  arc A112 (4.6449, 0.0349) -> (4.2978, 0.4544) centre (4.2139, 0.0317) ccw
  line L67 (4.2978, 0.4544) -> (3.8554, 0.5422)
  arc A113 (3.2949, 1.0401) -> (3.8554, 0.5422) centre (3.9996, 1.2691) ccw
  line L68 (3.2949, 1.0401) -> (3.2769, 1.0952)
  arc A114 (3.4378, 1.8274) -> (3.2769, 1.0952) centre (3.9817, 1.3242) ccw
  line L69 (3.4378, 1.8274) -> (3.7441, 2.1585)
  arc A115 (3.7441, 2.1585) -> (3.7783, 2.7019) centre (3.4277, 2.4512) ccw
  arc A116 (3.7783, 2.7019) -> (3.7373, 2.7584) centre (0, 0) ccw
  arc A117 (3.7373, 2.7584) -> (3.2099, 2.8938) centre (3.3905, 2.5025) ccw
  line L70 (3.2099, 2.8938) -> (2.8003, 2.7048)
  arc A118 (2.0543, 2.7781) -> (2.8003, 2.7048) centre (2.4898, 3.3776) ccw
  line L71 (2.0543, 2.7781) -> (2.0073, 2.8122)
  arc A119 (1.7071, 3.4991) -> (2.0073, 2.8122) centre (2.4429, 3.4117) ccw
  line L72 (1.7071, 3.4991) -> (1.7603, 3.947)
  arc A120 (1.7603, 3.947) -> (1.4685, 4.4067) centre (1.3323, 3.9979) ccw
  arc A121 (1.4685, 4.4067) -> (1.4021, 4.4283) centre (0, 0) ccw
  arc A122 (1.4021, 4.4283) -> (0.8959, 4.2279) centre (1.272, 4.0174) ccw
  line L73 (0.8959, 4.2279) -> (0.6757, 3.8342)
  arc A123 (0.029, 3.455) -> (0.6757, 3.8342) centre (0.029, 4.196) ccw
  line L74 (0.029, 3.455) -> (-0.029, 3.455)
  arc A124 (-0.6757, 3.8342) -> (-0.029, 3.455) centre (-0.029, 4.196) ccw
  line L75 (-0.6757, 3.8342) -> (-0.8959, 4.2279)
  arc A125 (-0.8959, 4.2279) -> (-1.4021, 4.4283) centre (-1.272, 4.0174) ccw
  arc A126 (-1.4021, 4.4283) -> (-1.4685, 4.4067) centre (0, 0) ccw
  arc A127 (-1.4685, 4.4067) -> (-1.7603, 3.947) centre (-1.3323, 3.9979) ccw
  line L76 (-1.7603, 3.947) -> (-1.7071, 3.4991)
  arc A128 (-2.0073, 2.8122) -> (-1.7071, 3.4991) centre (-2.4429, 3.4117) ccw
  line L77 (-2.0073, 2.8122) -> (-2.0543, 2.7781)
  arc A129 (-2.8003, 2.7048) -> (-2.0543, 2.7781) centre (-2.4898, 3.3776) ccw
  line L78 (-2.8003, 2.7048) -> (-3.2099, 2.8938)
  arc A130 (-3.2099, 2.8938) -> (-3.7373, 2.7584) centre (-3.3905, 2.5025) ccw
  arc A131 (-3.7373, 2.7584) -> (-3.7783, 2.7019) centre (0, 0) ccw
  arc A132 (-3.7783, 2.7019) -> (-3.7441, 2.1585) centre (-3.4277, 2.4512) ccw
  line L79 (-3.7441, 2.1585) -> (-3.4378, 1.8274)
  arc A133 (-3.2769, 1.0952) -> (-3.4378, 1.8274) centre (-3.9817, 1.3242) ccw
  line L80 (-3.2769, 1.0952) -> (-3.2949, 1.0401)
  arc A134 (-3.8554, 0.5422) -> (-3.2949, 1.0401) centre (-3.9996, 1.2691) ccw
  line L81 (-3.8554, 0.5422) -> (-4.2978, 0.4544)
  arc A135 (-4.2978, 0.4544) -> (-4.6449, 0.0349) centre (-4.2139, 0.0317) ccw
  arc A136 (-4.6449, 0.0349) -> (-4.6449, -0.0349) centre (0, 0) ccw
  arc A137 (-4.6449, -0.0349) -> (-4.2978, -0.4544) centre (-4.2139, -0.0317) ccw
  line L82 (-4.2978, -0.4544) -> (-3.8554, -0.5422)
  arc A138 (-3.2949, -1.0401) -> (-3.8554, -0.5422) centre (-3.9996, -1.2691) ccw
  line L83 (-3.2949, -1.0401) -> (-3.2769, -1.0952)
  arc A139 (-3.4378, -1.8274) -> (-3.2769, -1.0952) centre (-3.9817, -1.3242) ccw
  line L84 (-3.4378, -1.8274) -> (-3.7441, -2.1585)
  arc A140 (-2.0543, -2.7781) -> (-2.8003, -2.7048) centre (-2.4898, -3.3776) ccw
  line L85 (-2.0543, -2.7781) -> (-2.0073, -2.8122)
  arc A141 (-1.7071, -3.4991) -> (-2.0073, -2.8122) centre (-2.4429, -3.4117) ccw
  line L86 (-1.7071, -3.4991) -> (-1.7603, -3.947)
  arc A142 (-1.7603, -3.947) -> (-1.4685, -4.4067) centre (-1.3323, -3.9979) ccw
  arc A143 (-1.4685, -4.4067) -> (-1.4021, -4.4283) centre (0, 0) ccw
  arc A144 (-1.4021, -4.4283) -> (-0.8959, -4.2279) centre (-1.272, -4.0174) ccw
  line L87 (-0.8959, -4.2279) -> (-0.6757, -3.8342)
  point P0 (0, 0)
  dimension "d7" = 0.2
  dimension "d9" = 4.15
  dimension "d10" = 0.25
extrude "Extrusion2" add sketch "Sketch3" along normal blind 10
chamfer "Chamfer2" distance 0.1 angle 45 2 edges at (2.075, 10, 0) (2.075, 0, 0)
properties part number "Pulley HTD 3M 10T"
